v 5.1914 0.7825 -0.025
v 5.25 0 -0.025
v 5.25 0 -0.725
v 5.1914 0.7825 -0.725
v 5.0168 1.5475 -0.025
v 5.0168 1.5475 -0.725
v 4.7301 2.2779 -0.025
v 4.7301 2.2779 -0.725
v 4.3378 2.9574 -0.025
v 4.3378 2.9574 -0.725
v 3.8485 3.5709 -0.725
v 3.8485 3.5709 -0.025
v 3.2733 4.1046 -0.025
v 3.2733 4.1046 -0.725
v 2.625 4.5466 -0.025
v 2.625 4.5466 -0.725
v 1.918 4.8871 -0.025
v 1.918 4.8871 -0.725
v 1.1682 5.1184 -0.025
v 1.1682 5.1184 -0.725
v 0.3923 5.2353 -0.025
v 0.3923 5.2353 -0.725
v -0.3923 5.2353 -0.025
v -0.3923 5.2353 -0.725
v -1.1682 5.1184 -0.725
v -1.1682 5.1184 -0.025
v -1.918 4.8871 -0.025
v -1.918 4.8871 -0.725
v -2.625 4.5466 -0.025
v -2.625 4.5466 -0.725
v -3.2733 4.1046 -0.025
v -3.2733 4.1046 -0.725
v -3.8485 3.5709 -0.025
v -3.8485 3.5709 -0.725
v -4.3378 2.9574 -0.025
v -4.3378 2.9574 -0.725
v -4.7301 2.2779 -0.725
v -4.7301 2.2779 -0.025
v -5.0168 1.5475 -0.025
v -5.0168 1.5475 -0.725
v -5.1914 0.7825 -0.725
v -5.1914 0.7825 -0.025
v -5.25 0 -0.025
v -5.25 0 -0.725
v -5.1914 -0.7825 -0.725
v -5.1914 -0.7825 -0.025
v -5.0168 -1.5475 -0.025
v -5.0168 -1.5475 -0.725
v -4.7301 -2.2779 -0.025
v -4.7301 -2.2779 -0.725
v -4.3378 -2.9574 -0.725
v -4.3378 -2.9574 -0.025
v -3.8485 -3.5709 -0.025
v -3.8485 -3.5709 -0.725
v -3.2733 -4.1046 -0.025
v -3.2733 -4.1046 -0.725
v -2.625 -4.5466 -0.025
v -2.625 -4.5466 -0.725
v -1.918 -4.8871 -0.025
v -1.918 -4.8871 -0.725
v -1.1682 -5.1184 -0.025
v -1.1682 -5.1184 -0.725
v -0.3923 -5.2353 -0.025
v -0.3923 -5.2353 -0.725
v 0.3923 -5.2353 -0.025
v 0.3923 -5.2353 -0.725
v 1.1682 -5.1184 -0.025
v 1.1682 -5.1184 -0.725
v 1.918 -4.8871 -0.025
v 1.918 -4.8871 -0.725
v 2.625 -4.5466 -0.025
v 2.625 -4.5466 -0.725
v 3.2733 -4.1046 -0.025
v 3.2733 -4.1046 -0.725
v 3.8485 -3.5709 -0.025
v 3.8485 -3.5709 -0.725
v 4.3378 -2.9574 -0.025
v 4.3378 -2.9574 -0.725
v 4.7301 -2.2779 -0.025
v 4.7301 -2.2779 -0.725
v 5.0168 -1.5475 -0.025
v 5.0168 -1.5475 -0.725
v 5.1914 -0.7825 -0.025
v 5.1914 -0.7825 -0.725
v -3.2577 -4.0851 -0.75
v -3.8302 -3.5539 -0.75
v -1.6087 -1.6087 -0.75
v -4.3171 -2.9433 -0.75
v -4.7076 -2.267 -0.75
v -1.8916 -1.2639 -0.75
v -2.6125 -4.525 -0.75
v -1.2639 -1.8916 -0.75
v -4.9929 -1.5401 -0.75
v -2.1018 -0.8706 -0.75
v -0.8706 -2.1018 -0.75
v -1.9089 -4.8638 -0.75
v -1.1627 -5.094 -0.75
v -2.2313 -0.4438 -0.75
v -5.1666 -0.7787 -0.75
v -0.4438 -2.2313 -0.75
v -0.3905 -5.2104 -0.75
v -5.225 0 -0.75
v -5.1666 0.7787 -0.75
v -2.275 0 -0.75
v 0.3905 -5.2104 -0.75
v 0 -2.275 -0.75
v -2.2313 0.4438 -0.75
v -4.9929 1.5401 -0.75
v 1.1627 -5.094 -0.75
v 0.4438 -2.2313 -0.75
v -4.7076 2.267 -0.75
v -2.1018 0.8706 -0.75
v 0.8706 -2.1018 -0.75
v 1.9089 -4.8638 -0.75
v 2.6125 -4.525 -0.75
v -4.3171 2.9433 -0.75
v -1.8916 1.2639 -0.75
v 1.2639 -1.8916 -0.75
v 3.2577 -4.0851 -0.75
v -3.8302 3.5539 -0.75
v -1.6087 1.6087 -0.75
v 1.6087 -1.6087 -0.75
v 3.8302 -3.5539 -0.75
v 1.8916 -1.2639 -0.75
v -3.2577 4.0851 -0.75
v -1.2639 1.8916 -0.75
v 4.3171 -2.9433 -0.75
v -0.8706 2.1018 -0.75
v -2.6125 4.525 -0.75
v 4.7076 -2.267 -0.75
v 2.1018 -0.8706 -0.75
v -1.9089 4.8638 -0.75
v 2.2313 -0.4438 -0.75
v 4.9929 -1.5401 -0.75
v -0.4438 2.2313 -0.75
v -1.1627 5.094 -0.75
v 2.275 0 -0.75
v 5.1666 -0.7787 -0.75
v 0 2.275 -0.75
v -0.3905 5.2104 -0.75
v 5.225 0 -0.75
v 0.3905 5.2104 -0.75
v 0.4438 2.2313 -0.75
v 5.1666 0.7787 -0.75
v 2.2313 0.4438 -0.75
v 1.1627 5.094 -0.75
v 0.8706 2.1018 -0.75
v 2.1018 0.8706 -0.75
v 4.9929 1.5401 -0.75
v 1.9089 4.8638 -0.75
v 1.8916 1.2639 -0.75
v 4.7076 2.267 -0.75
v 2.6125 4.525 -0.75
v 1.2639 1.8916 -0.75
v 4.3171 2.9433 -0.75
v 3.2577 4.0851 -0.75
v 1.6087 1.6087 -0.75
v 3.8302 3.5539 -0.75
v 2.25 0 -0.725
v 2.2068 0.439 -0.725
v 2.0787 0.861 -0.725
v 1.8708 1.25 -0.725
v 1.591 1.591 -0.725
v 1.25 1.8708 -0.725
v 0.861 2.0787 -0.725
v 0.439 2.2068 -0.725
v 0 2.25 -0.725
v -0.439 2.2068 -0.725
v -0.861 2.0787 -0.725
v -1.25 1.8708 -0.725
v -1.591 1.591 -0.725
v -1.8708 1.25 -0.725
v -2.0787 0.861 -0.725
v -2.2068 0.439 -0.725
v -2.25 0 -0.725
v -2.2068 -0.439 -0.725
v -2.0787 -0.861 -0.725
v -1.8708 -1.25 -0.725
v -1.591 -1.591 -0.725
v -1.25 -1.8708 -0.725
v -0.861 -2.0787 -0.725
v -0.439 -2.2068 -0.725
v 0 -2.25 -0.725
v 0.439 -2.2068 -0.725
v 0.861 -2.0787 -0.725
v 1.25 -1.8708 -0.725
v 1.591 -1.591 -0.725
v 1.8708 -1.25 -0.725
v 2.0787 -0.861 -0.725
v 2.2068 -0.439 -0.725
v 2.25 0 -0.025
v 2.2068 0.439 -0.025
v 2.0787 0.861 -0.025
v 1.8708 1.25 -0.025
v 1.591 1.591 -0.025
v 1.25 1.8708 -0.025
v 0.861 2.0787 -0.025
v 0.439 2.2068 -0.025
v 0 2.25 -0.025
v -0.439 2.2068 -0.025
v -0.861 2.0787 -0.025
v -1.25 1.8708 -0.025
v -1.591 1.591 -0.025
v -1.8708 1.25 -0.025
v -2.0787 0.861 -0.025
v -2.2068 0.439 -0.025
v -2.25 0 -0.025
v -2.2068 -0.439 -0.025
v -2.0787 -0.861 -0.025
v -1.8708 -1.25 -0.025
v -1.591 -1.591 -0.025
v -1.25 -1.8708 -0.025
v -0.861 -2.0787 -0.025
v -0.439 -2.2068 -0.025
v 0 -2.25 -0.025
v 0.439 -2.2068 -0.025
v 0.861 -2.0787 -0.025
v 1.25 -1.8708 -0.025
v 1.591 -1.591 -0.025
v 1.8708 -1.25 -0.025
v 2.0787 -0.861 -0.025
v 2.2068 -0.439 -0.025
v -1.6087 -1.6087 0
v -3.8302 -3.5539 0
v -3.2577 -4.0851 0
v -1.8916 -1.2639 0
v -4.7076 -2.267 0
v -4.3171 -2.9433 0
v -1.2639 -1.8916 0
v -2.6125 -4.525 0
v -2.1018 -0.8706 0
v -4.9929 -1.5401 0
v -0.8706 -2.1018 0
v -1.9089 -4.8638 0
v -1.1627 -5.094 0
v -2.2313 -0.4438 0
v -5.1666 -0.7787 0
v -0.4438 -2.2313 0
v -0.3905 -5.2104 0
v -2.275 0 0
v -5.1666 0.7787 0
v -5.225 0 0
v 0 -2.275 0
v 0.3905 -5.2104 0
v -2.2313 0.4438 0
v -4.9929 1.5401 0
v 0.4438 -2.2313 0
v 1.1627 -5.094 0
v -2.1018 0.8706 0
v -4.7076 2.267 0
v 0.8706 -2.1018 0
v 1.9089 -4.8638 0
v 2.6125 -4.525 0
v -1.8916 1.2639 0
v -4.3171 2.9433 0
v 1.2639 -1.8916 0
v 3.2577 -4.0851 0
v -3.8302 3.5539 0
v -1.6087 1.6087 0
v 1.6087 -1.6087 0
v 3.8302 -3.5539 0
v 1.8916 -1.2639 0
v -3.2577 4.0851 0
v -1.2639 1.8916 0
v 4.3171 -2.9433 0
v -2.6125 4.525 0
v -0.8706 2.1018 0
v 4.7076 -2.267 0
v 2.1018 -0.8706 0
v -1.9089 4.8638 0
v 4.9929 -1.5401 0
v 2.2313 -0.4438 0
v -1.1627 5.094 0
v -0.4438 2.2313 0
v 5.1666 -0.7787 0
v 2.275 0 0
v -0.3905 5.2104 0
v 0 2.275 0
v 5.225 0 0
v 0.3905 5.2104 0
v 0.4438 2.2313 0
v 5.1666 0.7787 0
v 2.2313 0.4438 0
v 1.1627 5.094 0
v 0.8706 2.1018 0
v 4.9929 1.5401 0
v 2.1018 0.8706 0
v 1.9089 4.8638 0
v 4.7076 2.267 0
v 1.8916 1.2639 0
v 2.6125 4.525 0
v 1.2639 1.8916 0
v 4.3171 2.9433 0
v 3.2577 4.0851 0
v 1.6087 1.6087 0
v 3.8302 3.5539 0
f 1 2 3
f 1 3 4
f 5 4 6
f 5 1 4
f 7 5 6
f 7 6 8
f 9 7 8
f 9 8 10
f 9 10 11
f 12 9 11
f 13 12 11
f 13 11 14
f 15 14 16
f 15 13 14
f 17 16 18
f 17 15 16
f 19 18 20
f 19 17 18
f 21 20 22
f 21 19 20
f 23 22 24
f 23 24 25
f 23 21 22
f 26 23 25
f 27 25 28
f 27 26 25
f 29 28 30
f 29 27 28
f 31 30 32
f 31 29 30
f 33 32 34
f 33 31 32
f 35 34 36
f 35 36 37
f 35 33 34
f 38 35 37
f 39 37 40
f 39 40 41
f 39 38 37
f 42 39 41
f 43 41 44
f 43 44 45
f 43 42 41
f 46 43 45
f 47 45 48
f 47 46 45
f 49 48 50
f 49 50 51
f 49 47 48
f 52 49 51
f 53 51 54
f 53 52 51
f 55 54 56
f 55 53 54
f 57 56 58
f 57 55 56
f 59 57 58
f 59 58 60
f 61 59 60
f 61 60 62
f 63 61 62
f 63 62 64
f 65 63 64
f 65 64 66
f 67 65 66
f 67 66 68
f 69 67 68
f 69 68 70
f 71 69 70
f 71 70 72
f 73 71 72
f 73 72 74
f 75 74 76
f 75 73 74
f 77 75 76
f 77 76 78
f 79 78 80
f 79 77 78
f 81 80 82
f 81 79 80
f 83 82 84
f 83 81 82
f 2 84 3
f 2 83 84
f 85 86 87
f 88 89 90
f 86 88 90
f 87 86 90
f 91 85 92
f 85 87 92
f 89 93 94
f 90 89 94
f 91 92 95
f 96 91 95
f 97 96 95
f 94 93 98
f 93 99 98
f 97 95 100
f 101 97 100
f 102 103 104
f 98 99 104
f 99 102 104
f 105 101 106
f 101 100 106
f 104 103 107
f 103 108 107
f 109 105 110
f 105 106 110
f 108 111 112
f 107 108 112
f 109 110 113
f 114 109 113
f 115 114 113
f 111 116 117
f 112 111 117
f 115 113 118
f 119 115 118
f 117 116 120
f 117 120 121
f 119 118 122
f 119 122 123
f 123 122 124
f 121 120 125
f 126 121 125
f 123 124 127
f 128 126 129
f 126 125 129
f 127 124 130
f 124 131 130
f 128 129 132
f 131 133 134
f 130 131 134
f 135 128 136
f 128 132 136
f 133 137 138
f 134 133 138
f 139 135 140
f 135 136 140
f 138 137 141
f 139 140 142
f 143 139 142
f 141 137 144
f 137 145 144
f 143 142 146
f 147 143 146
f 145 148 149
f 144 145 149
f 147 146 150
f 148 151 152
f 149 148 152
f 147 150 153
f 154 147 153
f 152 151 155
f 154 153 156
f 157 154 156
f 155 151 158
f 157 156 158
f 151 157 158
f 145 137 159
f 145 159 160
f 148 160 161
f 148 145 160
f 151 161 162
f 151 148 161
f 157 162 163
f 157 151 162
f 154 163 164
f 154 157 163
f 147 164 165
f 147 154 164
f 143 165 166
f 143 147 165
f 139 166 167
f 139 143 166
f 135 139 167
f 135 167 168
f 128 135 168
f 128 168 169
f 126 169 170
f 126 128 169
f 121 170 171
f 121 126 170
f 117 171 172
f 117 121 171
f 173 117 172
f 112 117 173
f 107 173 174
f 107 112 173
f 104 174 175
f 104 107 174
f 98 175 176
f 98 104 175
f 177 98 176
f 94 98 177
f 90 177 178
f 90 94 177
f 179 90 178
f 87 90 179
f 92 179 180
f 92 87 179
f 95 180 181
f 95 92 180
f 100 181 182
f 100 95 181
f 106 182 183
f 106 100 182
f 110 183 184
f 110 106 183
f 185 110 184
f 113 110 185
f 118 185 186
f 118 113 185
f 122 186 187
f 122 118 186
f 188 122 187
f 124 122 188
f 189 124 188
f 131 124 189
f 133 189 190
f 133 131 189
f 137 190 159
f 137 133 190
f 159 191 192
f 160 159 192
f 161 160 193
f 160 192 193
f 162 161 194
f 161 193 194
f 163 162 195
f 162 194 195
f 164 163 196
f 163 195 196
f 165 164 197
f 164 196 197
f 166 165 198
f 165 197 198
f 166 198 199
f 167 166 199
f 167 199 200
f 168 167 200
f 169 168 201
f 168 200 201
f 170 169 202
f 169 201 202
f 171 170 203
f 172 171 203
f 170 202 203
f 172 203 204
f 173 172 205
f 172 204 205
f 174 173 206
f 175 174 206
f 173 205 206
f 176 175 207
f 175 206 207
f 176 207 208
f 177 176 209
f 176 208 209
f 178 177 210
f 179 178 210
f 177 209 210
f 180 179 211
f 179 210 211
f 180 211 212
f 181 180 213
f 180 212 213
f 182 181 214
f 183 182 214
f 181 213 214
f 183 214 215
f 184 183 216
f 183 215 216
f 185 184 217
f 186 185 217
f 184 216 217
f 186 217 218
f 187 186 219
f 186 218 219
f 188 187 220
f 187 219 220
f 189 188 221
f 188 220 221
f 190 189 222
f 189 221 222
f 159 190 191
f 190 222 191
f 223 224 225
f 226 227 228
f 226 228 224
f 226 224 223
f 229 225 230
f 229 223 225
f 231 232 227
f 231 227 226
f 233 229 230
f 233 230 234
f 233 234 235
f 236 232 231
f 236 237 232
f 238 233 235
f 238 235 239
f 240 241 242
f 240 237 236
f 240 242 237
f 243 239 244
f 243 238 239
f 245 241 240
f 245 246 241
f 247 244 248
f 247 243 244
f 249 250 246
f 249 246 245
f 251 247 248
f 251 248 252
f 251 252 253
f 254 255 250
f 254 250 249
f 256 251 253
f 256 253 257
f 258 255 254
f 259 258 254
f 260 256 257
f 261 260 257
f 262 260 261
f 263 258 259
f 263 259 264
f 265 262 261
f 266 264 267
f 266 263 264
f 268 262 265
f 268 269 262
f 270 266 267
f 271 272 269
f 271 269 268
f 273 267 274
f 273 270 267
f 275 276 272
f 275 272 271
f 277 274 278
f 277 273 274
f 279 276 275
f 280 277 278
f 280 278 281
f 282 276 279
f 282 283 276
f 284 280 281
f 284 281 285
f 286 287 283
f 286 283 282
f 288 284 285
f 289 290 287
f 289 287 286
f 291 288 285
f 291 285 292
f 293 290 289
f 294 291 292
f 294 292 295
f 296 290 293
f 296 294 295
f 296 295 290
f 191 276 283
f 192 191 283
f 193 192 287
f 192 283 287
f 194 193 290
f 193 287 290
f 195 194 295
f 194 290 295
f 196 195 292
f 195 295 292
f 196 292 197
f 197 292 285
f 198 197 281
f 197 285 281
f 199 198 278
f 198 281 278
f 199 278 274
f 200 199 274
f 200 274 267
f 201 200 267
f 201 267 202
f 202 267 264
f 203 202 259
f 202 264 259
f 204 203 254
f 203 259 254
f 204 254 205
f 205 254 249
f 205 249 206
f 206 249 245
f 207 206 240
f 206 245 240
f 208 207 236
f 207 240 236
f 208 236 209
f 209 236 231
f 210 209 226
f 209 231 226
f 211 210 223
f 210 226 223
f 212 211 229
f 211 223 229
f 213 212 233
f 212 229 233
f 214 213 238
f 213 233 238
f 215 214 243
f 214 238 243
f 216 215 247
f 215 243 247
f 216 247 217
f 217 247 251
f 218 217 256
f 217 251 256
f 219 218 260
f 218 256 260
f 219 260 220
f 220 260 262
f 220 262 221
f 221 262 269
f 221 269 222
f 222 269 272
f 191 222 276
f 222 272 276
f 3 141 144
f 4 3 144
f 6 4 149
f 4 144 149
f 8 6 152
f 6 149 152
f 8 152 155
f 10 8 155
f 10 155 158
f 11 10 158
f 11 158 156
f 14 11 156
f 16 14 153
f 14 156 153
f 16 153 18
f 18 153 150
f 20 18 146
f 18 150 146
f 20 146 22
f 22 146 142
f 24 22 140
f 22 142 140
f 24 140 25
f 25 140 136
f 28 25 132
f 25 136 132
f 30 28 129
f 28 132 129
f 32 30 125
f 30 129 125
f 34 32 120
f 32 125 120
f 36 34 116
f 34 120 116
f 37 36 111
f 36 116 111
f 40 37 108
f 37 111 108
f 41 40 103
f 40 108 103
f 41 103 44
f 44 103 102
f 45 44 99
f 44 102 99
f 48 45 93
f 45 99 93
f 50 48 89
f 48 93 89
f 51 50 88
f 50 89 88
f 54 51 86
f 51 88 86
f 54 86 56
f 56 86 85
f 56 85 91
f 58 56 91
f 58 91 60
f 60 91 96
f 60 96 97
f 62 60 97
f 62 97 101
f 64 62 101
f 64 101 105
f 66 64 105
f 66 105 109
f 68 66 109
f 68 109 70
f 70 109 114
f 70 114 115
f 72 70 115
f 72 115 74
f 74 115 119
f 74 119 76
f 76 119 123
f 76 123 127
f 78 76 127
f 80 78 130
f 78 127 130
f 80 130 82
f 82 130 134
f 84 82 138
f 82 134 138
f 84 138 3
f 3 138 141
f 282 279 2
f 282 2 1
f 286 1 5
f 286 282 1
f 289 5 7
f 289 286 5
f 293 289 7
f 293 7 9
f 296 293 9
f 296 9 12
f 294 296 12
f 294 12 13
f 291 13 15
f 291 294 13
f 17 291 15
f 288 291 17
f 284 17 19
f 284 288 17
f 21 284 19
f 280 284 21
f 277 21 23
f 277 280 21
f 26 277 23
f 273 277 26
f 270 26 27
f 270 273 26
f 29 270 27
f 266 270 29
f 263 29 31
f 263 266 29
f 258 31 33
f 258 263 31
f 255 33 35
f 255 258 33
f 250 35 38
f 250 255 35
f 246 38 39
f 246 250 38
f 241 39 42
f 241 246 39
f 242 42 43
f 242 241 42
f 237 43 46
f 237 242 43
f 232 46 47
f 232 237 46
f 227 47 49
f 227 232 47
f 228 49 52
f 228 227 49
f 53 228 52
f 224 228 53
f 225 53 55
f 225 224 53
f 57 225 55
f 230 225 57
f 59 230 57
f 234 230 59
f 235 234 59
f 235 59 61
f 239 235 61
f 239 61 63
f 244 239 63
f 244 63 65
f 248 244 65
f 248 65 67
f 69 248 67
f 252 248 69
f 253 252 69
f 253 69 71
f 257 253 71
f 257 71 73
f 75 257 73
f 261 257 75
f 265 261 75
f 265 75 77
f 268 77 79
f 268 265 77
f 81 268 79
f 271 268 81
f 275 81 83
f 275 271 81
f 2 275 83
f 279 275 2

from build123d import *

# Parameters (mm, degrees)
SKETCH1_R          = 5.25
SKETCH1_R_2        = 2.25
BASE_FLANGE1_DEPTH = 0.75
CHAMFER1_SIZE      = 0.025


# Sheet-metal steps are written as plain solids
with BuildPart() as part:
    # Sketch1 → Base-Flange1 (new body)
    with BuildSketch(Plane.XY):
        Circle(SKETCH1_R)
        Circle(SKETCH1_R_2, mode=Mode.SUBTRACT)
    extrude(amount=-BASE_FLANGE1_DEPTH)

    # Chamfer1
    chamfer1_edges = [part.edges().sort_by_distance(p)[0] for p in [
        (-5.25, 0, 0),
        (-5.25, 0, -0.75),
        (-2.25, 0, -0.75),
        (-2.25, 0, 0),
    ]]
    chamfer(chamfer1_edges, length=CHAMFER1_SIZE)


solid = part.part
